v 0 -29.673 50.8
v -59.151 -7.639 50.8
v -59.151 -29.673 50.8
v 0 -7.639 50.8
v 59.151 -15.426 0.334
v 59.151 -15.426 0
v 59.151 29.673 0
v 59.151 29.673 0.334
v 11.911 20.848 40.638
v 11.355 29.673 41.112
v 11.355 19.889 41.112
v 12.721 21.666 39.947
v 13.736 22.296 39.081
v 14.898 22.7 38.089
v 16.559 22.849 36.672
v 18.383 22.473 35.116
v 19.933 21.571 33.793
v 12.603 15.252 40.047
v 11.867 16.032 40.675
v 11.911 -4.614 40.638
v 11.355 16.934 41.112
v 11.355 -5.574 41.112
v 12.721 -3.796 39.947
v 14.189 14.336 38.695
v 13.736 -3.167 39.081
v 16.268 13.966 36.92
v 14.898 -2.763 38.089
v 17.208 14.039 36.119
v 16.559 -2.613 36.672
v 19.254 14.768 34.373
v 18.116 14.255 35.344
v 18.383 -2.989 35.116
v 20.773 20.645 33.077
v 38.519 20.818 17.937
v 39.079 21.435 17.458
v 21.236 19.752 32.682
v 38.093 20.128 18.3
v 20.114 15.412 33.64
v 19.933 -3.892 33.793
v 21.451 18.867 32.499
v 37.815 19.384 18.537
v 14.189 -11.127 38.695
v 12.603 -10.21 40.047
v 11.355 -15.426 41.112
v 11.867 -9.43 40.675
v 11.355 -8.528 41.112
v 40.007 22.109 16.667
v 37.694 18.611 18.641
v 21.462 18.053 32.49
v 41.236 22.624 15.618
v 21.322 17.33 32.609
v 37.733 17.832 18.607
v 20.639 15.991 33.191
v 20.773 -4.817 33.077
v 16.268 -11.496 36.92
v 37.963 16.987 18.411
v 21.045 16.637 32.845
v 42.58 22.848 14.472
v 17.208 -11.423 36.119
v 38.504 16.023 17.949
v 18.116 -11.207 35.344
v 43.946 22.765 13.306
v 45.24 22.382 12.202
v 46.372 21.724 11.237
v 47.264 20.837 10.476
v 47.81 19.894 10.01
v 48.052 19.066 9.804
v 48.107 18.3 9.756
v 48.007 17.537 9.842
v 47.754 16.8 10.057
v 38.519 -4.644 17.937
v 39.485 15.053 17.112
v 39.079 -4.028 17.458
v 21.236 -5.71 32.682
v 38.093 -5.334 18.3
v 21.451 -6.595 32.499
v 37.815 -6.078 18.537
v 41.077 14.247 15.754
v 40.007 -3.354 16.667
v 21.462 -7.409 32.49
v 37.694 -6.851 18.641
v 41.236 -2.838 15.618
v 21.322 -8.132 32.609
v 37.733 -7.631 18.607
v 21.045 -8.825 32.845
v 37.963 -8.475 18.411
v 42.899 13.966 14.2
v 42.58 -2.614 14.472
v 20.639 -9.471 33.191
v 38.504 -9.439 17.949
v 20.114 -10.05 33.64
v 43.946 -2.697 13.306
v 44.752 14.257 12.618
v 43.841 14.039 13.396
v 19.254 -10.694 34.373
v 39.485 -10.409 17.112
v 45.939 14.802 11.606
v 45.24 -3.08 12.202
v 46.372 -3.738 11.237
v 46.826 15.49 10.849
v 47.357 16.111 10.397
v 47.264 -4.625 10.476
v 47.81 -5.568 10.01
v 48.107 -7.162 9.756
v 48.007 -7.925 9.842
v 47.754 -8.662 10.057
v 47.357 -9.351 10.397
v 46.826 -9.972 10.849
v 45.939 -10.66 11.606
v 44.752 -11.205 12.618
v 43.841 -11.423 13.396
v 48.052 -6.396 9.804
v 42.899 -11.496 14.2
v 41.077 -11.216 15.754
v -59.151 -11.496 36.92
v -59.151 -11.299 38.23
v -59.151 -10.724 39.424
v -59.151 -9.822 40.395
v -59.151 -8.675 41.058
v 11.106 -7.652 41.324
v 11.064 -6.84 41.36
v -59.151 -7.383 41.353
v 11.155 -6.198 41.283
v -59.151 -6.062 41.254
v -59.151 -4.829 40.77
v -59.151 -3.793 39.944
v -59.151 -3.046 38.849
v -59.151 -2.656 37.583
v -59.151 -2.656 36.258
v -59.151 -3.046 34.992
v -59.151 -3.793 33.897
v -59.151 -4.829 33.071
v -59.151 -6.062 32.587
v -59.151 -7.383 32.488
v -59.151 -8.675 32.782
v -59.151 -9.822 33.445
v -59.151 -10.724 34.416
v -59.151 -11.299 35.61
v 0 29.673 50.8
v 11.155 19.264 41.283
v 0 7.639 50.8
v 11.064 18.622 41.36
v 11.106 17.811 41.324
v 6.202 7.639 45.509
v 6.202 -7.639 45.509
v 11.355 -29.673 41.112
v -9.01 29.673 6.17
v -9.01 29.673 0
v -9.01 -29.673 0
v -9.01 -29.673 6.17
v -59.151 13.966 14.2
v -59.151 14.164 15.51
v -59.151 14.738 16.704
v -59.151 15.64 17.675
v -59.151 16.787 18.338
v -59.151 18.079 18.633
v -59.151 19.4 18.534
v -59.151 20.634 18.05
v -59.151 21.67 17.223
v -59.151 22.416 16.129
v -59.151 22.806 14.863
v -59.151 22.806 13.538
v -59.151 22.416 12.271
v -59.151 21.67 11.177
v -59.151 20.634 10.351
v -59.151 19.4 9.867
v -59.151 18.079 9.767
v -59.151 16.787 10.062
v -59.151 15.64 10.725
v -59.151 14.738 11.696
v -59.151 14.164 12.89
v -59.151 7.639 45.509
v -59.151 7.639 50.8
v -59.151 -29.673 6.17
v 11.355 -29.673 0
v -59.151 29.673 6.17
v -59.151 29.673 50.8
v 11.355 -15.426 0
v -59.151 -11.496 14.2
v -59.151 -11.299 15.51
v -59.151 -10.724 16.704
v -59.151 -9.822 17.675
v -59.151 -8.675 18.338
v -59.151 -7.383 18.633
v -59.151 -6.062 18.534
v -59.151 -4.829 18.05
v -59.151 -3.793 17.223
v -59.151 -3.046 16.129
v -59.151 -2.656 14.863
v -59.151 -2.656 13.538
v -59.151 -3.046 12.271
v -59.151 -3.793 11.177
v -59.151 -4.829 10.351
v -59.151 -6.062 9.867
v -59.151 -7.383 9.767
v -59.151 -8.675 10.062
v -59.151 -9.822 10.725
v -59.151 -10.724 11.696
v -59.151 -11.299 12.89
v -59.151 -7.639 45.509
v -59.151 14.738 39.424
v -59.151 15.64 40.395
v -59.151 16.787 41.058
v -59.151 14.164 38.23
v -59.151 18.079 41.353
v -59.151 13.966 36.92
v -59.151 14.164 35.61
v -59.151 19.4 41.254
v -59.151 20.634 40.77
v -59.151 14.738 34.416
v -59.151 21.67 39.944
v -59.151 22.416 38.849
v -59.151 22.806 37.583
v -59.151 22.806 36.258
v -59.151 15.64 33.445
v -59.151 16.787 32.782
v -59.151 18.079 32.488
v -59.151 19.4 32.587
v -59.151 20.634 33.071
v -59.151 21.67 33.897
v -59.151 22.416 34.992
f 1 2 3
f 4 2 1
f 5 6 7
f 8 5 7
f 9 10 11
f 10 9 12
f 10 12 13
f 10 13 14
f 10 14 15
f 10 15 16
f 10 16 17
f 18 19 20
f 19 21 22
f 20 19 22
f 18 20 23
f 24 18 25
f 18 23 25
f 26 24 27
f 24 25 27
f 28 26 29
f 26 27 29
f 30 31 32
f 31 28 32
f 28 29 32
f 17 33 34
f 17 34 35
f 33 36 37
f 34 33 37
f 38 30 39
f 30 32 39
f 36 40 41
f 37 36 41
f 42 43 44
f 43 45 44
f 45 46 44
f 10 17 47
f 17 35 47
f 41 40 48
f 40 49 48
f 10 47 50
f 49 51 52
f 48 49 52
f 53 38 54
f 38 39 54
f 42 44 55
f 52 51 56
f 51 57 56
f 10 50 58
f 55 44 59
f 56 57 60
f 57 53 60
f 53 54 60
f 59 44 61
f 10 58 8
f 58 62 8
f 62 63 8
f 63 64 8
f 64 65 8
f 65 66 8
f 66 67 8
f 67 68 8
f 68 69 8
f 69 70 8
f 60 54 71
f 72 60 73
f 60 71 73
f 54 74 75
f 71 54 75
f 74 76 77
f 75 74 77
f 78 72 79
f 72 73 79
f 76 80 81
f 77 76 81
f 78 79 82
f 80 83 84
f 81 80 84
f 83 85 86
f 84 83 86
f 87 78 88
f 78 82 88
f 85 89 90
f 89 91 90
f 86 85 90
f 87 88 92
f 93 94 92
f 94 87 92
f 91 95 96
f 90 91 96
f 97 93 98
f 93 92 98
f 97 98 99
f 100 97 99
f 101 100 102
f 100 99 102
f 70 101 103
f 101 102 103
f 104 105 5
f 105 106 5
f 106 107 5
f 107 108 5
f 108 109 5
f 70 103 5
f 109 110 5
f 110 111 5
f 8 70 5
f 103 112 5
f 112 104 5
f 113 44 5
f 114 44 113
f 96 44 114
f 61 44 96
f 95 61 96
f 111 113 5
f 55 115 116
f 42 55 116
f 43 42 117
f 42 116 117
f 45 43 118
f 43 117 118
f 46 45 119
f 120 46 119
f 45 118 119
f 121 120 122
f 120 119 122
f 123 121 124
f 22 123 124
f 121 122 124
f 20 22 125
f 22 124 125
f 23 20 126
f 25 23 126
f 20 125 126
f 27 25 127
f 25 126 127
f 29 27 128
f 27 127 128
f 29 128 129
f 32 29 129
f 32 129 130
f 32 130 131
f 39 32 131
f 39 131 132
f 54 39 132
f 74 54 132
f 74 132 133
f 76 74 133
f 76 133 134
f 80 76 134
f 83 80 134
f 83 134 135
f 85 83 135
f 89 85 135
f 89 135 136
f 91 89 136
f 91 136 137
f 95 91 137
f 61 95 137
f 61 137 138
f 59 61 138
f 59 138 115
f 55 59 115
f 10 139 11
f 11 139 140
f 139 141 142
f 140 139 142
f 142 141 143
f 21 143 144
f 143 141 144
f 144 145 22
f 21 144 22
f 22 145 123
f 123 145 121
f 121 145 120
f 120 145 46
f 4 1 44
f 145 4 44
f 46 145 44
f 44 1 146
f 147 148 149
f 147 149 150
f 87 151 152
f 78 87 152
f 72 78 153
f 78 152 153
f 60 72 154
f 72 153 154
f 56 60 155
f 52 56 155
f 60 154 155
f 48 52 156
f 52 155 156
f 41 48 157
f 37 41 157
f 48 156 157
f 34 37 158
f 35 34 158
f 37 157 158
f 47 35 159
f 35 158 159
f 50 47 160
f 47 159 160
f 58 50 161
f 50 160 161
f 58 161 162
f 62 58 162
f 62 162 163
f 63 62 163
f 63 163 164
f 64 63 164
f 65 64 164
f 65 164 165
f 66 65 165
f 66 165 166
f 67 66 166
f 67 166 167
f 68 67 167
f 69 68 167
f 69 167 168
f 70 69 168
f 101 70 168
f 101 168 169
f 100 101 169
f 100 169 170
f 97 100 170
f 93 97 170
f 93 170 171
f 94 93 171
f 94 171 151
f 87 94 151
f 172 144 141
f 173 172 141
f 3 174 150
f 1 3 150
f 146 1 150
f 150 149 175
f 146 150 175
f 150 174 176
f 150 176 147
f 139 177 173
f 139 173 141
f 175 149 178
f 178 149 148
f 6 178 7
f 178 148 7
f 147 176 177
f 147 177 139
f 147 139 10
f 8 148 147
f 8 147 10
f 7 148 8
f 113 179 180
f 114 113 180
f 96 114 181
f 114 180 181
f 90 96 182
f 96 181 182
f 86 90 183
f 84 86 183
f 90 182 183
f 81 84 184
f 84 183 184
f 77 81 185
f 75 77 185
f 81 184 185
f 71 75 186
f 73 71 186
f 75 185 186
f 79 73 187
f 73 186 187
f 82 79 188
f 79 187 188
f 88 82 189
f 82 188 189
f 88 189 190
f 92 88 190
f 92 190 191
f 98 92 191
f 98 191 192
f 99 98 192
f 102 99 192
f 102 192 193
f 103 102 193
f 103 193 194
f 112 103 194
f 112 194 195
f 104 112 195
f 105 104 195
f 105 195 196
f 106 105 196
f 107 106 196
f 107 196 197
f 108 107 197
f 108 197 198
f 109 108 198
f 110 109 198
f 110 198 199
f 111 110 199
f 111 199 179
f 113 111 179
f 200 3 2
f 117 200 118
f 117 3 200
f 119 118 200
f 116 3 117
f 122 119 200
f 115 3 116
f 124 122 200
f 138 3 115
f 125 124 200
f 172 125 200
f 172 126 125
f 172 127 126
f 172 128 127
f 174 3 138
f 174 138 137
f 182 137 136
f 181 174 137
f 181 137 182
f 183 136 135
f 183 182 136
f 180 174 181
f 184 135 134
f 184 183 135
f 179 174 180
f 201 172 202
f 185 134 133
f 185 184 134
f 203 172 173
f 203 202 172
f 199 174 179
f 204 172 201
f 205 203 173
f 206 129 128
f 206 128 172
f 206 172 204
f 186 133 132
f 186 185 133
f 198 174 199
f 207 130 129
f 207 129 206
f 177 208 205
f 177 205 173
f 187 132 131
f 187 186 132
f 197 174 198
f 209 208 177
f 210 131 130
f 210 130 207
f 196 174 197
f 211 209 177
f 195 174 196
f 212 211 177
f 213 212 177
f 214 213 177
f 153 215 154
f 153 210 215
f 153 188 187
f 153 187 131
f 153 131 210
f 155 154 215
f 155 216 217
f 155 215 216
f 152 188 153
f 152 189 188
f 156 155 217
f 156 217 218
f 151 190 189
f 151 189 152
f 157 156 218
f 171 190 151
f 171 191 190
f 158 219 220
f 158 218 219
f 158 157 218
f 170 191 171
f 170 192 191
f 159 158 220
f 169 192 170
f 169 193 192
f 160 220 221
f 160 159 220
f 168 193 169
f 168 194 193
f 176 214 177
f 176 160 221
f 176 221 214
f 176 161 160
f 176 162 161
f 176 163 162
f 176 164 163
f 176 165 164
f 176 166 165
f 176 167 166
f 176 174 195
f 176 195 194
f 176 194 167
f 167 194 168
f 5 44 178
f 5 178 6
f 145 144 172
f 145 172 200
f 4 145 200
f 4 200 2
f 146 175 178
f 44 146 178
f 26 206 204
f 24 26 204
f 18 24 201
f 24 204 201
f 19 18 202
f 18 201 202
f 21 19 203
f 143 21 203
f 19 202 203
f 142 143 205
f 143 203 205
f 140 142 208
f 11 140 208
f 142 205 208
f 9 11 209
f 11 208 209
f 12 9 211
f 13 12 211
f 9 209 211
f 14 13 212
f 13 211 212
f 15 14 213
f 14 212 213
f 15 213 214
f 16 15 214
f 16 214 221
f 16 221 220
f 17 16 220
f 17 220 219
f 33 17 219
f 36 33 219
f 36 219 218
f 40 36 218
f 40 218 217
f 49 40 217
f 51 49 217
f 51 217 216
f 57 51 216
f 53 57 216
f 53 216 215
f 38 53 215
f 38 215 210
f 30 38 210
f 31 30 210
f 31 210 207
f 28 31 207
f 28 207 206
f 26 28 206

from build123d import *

# Parameters (mm, degrees)
F0_W      = 118.301205337
F0_H      = 59.3464635313
F1_DEPTH  = 50.8
F2_W      = 52.4965906516
F2_H      = 14.247585088
F3_DEPTH  = 112.014
F4_W      = 50.1409089193
F4_H      = 6.169681903
F5_DEPTH  = 123.19
F7_DEPTH  = 96.52
F8_W      = 15.2773074806
F8_H      = 5.2911678412
F9_DEPTH  = 203.962
F10_R     = 4.445
F11_DEPTH = 210.566


with BuildPart() as f1:
    # F0 (on Top) → F1 (new body)
    with BuildSketch(Plane.XY):
        Rectangle(F0_W, F0_H)
    extrude(amount=F1_DEPTH)

    # F2 (on face) → F3 (cut)
    with BuildSketch(Plane.XY.offset(50.8)):
        with Locations((37.6030090265, -22.5494392216)):
            Rectangle(F2_W, F2_H)
    extrude(amount=-F3_DEPTH, mode=Mode.SUBTRACT)

    # F4 (on face) → F5 (cut)
    with BuildSketch(Plane.XZ.offset(29.6732317656)):
        with Locations((-34.0801482089, 3.0848409515)):
            Rectangle(F4_W, F4_H)
    extrude(amount=-F5_DEPTH, mode=Mode.SUBTRACT)

    # F6 (on face) → F7 (cut)
    with BuildSketch(Plane.XZ.offset(29.6732317656)):
        Polygon((11.3547137007, 50.8), (0, 50.8), (11.3547137007, 41.1124470571), align=None)
        Polygon((11.3547137007, 50.8), (11.3547137007, 41.1124470571), (59.5423281193, 0), (59.5423281193, 50.8), align=None)
    extrude(amount=-F7_DEPTH, mode=Mode.SUBTRACT)

    # F8 (on face) → F9 (cut)
    with BuildSketch(Plane(origin=(-59.1506026685, 0, 0), x_dir=(0, -1, 0), z_dir=(-1, 0, 0))):
        with Locations((0, 48.1544160794)):
            Rectangle(F8_W, F8_H)
    extrude(amount=-F9_DEPTH, mode=Mode.SUBTRACT)

    # F10 (on face) → F11 (cut)
    with BuildSketch(Plane(origin=(-59.1506026685, 0, 0), x_dir=(0, -1, 0), z_dir=(-1, 0, 0))):
        with Locations((-18.4111148119, 36.9201600552)):
            Circle(F10_R)
        with Locations((7.0510655642, 36.9201600552)):
            Circle(F10_R)
        with Locations((7.0510655642, 14.2000615597)):
            Circle(F10_R)
        with Locations((-18.4111148119, 14.2000615597)):
            Circle(F10_R)
    extrude(amount=-F11_DEPTH, mode=Mode.SUBTRACT)


solid = f1.part
